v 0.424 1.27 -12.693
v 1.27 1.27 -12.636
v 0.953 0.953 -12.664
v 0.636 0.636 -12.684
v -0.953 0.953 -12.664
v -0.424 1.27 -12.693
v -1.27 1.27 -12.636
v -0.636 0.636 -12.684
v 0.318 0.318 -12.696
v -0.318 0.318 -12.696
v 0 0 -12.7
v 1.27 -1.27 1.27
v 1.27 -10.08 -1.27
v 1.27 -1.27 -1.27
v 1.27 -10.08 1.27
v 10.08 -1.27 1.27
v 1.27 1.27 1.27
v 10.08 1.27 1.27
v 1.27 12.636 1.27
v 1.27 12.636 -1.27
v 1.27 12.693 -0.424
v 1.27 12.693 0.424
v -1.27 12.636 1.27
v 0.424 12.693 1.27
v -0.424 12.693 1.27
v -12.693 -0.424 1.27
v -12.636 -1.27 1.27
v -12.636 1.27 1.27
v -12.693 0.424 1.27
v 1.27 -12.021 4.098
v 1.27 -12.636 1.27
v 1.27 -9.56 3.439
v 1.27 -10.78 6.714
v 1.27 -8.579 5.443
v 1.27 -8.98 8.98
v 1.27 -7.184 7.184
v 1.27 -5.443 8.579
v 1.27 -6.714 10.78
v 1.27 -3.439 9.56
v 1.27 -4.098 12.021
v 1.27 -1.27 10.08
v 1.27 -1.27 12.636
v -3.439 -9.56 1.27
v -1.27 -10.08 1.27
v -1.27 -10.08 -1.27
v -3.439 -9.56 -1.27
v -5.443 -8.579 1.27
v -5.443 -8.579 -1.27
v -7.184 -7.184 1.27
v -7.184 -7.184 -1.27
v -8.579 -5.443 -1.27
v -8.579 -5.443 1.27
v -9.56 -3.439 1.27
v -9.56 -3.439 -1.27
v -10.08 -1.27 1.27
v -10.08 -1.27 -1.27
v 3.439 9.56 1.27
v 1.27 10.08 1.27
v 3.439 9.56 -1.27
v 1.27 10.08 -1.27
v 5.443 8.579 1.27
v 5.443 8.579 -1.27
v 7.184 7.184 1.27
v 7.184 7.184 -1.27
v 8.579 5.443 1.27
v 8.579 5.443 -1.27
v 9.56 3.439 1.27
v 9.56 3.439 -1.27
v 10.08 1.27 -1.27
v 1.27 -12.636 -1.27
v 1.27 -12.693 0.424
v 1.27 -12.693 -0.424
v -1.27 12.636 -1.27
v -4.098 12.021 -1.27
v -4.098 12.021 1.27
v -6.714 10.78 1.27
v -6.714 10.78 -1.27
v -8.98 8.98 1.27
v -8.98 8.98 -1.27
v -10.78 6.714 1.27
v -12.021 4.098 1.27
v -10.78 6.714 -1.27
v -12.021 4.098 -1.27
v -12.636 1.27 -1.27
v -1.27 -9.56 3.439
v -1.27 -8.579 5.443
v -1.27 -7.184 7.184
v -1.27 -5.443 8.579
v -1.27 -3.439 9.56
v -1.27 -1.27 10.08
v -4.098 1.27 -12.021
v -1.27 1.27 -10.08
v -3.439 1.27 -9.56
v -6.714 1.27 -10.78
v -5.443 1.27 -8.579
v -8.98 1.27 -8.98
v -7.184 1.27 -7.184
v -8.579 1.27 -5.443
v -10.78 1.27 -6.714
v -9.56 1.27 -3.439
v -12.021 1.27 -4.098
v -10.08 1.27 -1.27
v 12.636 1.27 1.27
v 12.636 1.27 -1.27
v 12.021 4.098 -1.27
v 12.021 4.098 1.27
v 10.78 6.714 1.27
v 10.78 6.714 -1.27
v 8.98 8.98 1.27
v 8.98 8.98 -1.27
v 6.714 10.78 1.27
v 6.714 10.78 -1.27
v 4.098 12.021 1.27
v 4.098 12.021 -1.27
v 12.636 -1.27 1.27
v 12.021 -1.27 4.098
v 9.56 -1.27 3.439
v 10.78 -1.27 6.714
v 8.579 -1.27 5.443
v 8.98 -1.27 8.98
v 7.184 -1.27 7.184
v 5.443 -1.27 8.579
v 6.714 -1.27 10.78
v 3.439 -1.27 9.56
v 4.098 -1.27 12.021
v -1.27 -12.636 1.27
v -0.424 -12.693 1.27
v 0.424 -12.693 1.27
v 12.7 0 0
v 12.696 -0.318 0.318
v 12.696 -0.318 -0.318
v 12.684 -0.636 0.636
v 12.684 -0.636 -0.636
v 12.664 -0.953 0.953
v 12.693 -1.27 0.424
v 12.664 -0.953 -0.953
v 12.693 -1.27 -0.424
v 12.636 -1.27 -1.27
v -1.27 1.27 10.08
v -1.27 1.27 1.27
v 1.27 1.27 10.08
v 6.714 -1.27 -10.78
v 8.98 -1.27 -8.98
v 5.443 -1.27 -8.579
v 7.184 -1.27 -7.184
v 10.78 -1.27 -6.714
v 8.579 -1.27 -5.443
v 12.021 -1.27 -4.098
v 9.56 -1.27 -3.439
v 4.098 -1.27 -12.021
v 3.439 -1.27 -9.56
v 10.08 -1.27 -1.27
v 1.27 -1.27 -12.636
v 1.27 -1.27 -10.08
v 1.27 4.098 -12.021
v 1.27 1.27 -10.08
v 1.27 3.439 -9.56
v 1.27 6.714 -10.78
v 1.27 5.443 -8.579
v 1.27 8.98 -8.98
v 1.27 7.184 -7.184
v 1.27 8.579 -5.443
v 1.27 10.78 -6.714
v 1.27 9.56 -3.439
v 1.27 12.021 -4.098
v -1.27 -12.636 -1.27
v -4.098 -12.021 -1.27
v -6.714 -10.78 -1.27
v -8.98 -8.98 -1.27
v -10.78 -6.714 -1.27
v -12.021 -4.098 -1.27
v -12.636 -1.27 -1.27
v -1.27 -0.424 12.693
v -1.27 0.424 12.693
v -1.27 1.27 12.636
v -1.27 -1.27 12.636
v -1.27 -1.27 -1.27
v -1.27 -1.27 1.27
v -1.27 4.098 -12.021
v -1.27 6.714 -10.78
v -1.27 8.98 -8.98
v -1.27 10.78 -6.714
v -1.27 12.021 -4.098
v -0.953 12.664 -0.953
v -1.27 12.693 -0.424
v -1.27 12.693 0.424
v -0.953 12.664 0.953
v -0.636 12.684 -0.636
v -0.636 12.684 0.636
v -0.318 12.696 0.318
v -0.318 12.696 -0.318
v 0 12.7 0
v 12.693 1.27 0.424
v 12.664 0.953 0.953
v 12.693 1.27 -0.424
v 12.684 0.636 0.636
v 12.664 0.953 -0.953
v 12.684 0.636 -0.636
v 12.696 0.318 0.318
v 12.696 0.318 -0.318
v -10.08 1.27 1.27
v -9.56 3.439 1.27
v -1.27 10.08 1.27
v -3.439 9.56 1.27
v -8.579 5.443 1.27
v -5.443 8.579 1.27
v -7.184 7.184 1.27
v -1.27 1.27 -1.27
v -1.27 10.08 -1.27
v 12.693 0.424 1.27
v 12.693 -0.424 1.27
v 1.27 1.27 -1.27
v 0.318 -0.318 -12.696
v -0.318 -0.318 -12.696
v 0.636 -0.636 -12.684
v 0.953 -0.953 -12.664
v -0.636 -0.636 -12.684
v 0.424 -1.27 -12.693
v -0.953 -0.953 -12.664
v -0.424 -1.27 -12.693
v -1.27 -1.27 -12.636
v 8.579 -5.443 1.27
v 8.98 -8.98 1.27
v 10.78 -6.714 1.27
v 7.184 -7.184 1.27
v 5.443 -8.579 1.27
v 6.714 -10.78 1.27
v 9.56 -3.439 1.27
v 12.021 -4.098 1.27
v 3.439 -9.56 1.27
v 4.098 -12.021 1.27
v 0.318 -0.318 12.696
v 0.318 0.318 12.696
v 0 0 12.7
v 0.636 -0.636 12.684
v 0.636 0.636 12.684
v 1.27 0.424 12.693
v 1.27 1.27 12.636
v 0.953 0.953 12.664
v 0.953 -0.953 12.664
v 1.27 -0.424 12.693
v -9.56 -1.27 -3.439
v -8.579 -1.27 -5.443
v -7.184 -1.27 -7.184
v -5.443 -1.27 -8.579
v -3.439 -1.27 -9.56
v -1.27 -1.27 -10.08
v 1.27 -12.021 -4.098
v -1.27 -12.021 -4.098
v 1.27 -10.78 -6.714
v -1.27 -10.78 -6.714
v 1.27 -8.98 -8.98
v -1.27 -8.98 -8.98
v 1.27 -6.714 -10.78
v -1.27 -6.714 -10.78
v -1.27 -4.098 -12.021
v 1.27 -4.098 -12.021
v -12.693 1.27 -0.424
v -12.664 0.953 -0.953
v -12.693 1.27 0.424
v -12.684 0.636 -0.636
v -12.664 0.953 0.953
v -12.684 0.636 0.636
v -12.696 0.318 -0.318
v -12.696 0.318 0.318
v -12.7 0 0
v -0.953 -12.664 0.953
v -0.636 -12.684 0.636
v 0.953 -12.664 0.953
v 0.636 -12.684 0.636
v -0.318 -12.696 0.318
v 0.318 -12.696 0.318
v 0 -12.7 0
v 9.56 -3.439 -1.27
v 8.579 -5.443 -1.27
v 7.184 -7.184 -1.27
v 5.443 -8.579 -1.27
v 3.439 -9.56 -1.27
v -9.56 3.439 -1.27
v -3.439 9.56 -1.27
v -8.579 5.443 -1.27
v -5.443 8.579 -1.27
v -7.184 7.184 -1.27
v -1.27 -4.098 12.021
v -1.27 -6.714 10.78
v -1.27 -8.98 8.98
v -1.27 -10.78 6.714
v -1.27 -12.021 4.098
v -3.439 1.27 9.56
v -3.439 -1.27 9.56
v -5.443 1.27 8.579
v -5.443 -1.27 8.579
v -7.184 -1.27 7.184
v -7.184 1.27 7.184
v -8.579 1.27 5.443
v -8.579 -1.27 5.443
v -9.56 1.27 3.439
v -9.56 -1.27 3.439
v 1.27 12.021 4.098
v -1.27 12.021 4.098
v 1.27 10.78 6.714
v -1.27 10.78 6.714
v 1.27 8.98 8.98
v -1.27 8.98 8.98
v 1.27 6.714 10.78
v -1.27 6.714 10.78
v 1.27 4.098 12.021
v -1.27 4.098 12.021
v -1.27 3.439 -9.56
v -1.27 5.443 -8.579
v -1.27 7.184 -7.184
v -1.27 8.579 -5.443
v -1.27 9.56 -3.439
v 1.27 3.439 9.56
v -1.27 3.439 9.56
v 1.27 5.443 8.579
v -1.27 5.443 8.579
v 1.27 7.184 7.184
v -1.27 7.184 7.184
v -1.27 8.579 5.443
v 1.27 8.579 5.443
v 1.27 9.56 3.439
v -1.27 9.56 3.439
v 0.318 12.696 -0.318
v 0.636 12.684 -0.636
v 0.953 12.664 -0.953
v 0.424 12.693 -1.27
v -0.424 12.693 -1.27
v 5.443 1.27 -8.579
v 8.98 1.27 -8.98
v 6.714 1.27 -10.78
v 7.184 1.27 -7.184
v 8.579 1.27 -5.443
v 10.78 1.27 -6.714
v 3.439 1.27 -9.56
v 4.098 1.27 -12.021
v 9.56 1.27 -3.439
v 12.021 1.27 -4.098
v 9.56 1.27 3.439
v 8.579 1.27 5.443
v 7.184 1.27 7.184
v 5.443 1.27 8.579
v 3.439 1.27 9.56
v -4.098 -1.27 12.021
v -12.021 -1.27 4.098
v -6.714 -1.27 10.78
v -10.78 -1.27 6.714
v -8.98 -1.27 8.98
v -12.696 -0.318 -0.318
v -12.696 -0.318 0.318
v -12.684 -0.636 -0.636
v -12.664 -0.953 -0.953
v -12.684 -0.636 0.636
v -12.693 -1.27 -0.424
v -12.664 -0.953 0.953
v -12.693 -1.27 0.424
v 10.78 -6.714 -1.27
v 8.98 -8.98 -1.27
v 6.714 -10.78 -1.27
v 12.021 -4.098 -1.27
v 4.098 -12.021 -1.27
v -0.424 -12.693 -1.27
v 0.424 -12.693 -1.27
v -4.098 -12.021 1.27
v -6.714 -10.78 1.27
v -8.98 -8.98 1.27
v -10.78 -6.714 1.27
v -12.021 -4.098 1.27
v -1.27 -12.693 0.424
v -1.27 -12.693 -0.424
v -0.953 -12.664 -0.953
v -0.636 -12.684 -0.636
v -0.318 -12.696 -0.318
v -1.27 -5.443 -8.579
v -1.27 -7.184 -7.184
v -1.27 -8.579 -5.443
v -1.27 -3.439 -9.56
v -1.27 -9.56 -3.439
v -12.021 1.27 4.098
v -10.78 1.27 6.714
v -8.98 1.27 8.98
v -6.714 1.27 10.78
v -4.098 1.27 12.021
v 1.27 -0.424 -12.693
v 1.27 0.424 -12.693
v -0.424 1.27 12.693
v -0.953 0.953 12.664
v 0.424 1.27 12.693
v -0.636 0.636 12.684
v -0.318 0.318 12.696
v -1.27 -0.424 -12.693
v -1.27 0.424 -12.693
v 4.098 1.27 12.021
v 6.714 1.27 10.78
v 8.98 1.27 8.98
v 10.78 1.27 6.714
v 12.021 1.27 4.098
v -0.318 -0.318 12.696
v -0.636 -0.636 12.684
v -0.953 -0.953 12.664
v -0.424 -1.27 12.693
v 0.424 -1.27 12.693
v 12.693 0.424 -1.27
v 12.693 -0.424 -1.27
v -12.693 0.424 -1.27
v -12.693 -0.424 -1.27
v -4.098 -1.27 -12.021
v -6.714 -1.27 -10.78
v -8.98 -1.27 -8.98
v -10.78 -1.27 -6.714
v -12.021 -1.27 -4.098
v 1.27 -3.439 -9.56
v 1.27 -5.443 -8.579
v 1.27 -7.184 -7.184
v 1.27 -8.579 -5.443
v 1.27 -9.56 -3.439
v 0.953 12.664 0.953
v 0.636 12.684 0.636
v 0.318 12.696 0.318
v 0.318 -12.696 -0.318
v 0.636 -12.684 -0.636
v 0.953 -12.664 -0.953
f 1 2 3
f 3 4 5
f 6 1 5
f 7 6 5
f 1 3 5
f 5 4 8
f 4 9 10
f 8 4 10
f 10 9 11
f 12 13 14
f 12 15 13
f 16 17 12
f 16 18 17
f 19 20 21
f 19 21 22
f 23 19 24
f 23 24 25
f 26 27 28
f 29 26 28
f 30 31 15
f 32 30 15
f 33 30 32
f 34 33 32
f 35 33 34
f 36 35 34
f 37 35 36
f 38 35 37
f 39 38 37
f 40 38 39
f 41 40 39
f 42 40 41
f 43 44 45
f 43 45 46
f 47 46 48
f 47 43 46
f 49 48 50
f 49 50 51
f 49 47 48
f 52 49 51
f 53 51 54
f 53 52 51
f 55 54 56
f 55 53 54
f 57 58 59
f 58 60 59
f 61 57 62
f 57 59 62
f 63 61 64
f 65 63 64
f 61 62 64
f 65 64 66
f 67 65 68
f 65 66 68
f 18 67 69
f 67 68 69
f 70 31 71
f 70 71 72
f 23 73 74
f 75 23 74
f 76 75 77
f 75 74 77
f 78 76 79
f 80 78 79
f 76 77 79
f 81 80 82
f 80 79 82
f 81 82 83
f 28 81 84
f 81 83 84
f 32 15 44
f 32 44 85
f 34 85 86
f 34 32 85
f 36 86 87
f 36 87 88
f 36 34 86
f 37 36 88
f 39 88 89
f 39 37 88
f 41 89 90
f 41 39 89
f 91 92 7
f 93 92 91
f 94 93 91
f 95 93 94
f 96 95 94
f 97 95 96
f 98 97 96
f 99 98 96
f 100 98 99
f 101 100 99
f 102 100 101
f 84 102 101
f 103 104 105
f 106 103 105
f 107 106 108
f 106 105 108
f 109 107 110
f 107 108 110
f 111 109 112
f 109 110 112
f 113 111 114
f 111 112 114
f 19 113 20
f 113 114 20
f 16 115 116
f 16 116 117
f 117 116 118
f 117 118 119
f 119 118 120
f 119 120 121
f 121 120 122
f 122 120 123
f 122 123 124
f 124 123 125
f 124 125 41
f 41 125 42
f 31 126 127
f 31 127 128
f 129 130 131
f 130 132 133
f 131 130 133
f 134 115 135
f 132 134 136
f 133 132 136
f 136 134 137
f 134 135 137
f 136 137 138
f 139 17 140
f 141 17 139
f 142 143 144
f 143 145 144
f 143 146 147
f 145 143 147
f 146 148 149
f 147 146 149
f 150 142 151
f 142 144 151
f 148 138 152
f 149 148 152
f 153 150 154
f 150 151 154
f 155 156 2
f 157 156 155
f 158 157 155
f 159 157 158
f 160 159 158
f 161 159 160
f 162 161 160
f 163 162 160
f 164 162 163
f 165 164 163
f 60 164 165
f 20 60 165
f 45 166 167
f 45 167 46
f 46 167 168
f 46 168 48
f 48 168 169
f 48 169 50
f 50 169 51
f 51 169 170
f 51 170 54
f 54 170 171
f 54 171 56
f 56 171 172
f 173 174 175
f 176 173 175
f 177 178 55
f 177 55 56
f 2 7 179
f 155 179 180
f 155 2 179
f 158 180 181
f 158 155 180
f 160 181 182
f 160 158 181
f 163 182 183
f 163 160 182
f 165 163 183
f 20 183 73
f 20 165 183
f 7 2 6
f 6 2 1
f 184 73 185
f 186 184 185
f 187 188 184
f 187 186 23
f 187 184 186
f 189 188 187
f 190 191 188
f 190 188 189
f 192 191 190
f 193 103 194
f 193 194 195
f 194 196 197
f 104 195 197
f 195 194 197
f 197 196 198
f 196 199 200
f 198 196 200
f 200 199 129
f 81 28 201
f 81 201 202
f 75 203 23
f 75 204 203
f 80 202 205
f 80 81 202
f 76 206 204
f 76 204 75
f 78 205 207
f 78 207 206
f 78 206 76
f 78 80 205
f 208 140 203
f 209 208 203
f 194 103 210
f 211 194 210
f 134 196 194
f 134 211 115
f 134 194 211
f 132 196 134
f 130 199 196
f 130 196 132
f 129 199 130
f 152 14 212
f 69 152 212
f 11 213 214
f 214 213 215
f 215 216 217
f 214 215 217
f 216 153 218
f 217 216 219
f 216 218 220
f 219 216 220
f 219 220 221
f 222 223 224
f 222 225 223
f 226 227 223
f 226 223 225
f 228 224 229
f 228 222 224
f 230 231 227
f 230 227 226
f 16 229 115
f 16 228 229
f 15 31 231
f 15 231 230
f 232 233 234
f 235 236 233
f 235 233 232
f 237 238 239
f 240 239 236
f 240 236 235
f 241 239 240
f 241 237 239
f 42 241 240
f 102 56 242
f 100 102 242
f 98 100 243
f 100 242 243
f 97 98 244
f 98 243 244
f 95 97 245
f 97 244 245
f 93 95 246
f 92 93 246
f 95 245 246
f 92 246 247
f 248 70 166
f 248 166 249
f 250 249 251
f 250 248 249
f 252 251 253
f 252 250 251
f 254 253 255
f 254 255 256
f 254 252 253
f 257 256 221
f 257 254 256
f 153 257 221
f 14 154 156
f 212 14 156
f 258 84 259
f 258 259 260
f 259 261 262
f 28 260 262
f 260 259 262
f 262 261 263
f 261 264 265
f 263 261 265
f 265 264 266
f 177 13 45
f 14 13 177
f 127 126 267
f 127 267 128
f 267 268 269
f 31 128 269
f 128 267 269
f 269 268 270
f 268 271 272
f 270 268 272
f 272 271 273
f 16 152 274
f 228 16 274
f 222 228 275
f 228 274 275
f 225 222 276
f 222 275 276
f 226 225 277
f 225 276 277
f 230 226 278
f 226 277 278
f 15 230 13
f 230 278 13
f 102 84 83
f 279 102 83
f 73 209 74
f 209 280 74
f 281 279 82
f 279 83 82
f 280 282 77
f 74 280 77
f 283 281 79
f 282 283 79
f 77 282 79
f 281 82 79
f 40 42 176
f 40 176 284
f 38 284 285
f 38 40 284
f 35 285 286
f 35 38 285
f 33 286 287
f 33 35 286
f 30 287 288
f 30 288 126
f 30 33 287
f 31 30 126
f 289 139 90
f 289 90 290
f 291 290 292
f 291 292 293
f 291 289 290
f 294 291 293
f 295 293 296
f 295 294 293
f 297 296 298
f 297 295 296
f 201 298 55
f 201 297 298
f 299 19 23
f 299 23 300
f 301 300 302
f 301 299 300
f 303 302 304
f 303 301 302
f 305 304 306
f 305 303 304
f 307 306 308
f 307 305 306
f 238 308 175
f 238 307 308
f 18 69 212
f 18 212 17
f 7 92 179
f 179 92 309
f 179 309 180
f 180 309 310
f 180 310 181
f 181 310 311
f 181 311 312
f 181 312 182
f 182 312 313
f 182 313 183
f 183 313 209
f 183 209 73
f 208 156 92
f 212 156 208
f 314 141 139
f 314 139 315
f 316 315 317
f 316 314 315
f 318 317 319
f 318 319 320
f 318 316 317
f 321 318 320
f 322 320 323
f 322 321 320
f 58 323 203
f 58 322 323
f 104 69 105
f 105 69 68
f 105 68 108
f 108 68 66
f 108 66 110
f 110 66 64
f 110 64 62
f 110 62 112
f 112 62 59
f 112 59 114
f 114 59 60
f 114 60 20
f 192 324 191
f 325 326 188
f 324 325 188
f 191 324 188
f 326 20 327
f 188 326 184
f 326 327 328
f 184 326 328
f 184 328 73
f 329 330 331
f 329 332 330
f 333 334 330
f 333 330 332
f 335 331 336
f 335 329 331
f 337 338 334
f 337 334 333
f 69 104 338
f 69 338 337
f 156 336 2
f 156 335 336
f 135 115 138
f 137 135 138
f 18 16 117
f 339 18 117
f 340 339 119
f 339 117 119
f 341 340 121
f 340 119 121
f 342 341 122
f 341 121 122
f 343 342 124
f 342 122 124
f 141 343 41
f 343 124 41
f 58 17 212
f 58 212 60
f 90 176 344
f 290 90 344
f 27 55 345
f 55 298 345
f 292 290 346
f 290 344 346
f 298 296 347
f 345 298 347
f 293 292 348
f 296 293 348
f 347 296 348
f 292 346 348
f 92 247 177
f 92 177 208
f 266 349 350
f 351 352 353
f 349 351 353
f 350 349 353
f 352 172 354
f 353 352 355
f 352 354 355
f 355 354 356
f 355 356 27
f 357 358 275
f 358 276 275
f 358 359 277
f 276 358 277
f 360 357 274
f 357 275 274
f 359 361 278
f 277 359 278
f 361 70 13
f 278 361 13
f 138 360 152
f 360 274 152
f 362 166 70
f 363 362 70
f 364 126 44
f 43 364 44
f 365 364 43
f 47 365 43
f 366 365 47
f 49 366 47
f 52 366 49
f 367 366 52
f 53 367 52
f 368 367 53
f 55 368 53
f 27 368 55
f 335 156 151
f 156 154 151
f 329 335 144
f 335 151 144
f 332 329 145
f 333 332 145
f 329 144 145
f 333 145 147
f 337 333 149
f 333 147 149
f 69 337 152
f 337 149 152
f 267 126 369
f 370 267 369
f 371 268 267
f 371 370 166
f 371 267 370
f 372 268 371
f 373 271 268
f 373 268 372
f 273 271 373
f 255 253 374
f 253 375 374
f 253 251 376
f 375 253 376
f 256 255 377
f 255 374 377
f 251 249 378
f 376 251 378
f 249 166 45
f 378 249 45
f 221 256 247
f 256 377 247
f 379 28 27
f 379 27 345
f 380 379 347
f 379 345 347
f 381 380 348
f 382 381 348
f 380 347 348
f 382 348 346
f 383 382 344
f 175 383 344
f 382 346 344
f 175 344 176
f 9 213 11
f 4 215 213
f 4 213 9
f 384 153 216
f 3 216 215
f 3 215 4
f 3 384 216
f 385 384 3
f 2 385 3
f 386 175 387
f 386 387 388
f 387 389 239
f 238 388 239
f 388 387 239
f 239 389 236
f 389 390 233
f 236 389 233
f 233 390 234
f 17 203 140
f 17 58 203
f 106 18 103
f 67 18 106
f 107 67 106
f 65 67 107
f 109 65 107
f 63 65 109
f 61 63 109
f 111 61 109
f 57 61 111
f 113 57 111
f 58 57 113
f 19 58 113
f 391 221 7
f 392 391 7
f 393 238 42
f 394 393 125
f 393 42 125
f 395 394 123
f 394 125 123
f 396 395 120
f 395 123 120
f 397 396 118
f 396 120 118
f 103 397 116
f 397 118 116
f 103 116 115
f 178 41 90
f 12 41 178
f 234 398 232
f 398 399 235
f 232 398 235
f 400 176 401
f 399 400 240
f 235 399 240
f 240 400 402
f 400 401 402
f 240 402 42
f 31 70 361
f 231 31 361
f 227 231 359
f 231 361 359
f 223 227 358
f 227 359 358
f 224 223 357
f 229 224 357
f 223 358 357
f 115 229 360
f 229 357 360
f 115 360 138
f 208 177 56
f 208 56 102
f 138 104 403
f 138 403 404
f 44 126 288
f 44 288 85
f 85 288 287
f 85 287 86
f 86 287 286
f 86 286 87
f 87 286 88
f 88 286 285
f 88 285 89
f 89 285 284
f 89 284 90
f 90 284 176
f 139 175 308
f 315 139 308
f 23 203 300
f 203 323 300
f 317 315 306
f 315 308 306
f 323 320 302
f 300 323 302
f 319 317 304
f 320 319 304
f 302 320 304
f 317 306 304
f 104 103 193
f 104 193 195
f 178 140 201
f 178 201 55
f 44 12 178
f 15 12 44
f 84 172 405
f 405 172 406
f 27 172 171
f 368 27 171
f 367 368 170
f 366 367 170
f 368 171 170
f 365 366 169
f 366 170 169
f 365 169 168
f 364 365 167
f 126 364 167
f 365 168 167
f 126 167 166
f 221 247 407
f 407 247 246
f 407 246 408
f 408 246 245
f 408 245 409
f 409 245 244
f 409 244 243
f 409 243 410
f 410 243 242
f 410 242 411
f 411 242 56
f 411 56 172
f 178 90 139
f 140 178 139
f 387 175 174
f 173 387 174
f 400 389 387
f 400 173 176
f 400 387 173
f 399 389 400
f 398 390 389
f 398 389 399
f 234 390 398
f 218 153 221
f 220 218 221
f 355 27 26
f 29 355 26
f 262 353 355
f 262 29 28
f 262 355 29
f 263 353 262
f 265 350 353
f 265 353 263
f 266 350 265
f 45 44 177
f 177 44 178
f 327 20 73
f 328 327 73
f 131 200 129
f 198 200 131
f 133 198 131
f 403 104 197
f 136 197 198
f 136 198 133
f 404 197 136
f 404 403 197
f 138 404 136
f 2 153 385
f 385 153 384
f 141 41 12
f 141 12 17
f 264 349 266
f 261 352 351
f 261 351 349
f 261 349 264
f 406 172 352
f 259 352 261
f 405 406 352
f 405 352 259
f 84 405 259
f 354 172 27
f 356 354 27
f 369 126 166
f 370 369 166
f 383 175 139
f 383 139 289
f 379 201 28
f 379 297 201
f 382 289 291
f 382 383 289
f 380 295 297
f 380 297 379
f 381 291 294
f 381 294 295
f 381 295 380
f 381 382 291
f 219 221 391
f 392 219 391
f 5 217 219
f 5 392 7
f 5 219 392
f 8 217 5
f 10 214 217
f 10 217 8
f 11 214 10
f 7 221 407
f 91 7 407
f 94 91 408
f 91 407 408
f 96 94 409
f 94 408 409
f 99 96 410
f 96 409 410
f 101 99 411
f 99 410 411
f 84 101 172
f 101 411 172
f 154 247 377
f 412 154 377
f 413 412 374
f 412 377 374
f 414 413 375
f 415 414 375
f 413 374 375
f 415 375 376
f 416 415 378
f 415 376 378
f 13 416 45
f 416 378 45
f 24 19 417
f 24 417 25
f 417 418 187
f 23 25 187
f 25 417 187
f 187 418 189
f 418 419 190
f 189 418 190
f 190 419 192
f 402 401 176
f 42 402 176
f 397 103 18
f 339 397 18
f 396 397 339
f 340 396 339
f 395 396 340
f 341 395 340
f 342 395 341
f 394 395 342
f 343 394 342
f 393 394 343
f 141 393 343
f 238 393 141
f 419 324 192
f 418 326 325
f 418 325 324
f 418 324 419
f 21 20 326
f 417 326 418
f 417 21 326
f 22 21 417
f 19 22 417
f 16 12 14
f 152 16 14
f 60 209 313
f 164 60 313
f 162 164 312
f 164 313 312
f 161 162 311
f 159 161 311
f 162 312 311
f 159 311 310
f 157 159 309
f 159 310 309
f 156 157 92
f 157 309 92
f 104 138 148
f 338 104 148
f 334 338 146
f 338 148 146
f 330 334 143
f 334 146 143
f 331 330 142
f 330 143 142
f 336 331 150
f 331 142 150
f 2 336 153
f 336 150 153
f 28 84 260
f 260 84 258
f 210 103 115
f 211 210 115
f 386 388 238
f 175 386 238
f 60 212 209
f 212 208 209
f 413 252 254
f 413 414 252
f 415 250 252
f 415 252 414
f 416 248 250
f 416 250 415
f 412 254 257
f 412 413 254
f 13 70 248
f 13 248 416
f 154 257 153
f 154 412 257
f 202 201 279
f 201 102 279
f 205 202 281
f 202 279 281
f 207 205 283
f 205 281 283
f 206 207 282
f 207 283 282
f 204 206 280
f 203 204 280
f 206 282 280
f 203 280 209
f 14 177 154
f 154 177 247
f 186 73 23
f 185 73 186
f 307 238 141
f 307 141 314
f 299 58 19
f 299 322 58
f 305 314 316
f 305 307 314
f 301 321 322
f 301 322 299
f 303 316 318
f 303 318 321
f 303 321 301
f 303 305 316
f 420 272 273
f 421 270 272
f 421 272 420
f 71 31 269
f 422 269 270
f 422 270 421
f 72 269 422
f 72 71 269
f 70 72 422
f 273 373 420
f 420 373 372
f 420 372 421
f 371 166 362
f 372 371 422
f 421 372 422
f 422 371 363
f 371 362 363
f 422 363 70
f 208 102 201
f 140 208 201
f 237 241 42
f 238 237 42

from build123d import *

# Parameters (mm, degrees)
F0_R          = 12.7
F1_DEPTH      = 1.27
F1_DEPTH_BACK = 1.27
F0_W          = 2.54
F0_H          = 2.54
F2_DEPTH      = 10.16
F2_DEPTH_BACK = 10.16
F3_DEPTH      = 1.27
F3_DEPTH_BACK = 1.27
F4_DEPTH      = 1.27
F4_DEPTH_BACK = 1.27
F5_DEPTH      = 1.27
F5_DEPTH_BACK = 1.27
F6_DEPTH      = 1.27
F6_DEPTH_BACK = 1.27


# Not quite as in the source:
# - a feature of the source that left no trace in its solid (it failed there, or was rolled back) is left out
# - a pattern or mirror of a feature is missing from the dataset's text; its kind, count and spacing are read off the source's solid


with BuildPart() as f1:
    # F0 (on Right) → F1 (new body, two sides)
    with BuildSketch(Plane.YZ) as f1_sk:
        Circle(F0_R)
        with BuildLine():
            ThreePointArc((-10.0803124952, 1.27), (-7.1842048969, 7.1842048969), (-1.27, 10.0803124952))
            ThreePointArc((-1.27, 10.0803124952), (0, 10.16), (1.27, 10.0803124952))
            ThreePointArc((1.27, 10.0803124952), (7.1842048969, 7.1842048969), (10.0803124952, 1.27))
            ThreePointArc((10.0803124952, 1.27), (10.1400585538, 0.6362487914), (10.16, 0))
            ThreePointArc((10.16, 0), (10.1400585538, -0.6362487914), (10.0803124952, -1.27))
            ThreePointArc((10.0803124952, -1.27), (7.1842048969, -7.1842048969), (1.27, -10.0803124952))
            ThreePointArc((1.27, -10.0803124952), (0, -10.16), (-1.27, -10.0803124952))
            ThreePointArc((-1.27, -10.0803124952), (-7.1842048969, -7.1842048969), (-10.0803124952, -1.27))
            ThreePointArc((-10.0803124952, -1.27), (-10.16, 0), (-10.0803124952, 1.27))
        make_face(mode=Mode.SUBTRACT)
    extrude(amount=F1_DEPTH)
    extrude(f1_sk.sketch, amount=-F1_DEPTH_BACK)

    # F1_copies: F1 across plane


with BuildPart() as f1_1:
    add(f1.part)
    add(f1.part.mirror(Plane(origin=(0, 0, 0), x_dir=(0.7071067812, 0, -0.7071067812), z_dir=(0.7071067812, 0, 0.7071067812))))

    # F1_copies1: F1 across plane


with BuildPart() as f1_2:
    add(f1_1.part)
    add(f1_1.part.mirror(Plane(origin=(0, 0, 0), x_dir=(-0.7071067812, 0.7071067812, 0), z_dir=(-0.7071067812, -0.7071067812, 0))))

    # F0 (on Right) → F2 (join, two sides)
    with BuildSketch(Plane.YZ) as f2_sk:
        Rectangle(F0_W, F0_H)
    extrude(amount=F2_DEPTH)
    extrude(f2_sk.sketch, amount=-F2_DEPTH_BACK)

    # F0 (on Right) → F3 (join, two sides)
    with BuildSketch(Plane.YZ) as f3_sk:
        with BuildLine():
            Line((1.27, -1.27), (-1.27, -1.27))
            Line((-1.27, -1.27), (-1.27, -10.0803124952))
            ThreePointArc((-1.27, -10.0803124952), (0, -10.16), (1.27, -10.0803124952))
            Line((1.27, -10.0803124952), (1.27, -1.27))
        make_face()
    extrude(amount=F3_DEPTH)
    extrude(f3_sk.sketch, amount=-F3_DEPTH_BACK)

    # F0 (on Right) → F4 (join, two sides)
    with BuildSketch(Plane.YZ) as f4_sk:
        with BuildLine():
            Line((10.0803124952, 1.27), (1.27, 1.27))
            Line((1.27, 1.27), (1.27, -1.27))
            Line((1.27, -1.27), (10.0803124952, -1.27))
            ThreePointArc((10.0803124952, -1.27), (10.1400585538, -0.6362487914), (10.16, 0))
            ThreePointArc((10.16, 0), (10.1400585538, 0.6362487914), (10.0803124952, 1.27))
        make_face()
    extrude(amount=F4_DEPTH)
    extrude(f4_sk.sketch, amount=-F4_DEPTH_BACK)

    # F0 (on Right) → F5 (join, two sides)
    with BuildSketch(Plane.YZ) as f5_sk:
        with BuildLine():
            Line((-1.27, -1.27), (-1.27, 1.27))
            Line((-1.27, 1.27), (-10.0803124952, 1.27))
            ThreePointArc((-10.0803124952, 1.27), (-10.16, 0), (-10.0803124952, -1.27))
            Line((-10.0803124952, -1.27), (-1.27, -1.27))
        make_face()
    extrude(amount=F5_DEPTH)
    extrude(f5_sk.sketch, amount=-F5_DEPTH_BACK)

    # F0 (on Right) → F6 (join, two sides)
    with BuildSketch(Plane.YZ) as f6_sk:
        with BuildLine():
            Line((-1.27, 10.0803124952), (-1.27, 1.27))
            Line((-1.27, 1.27), (1.27, 1.27))
            Line((1.27, 1.27), (1.27, 10.0803124952))
            ThreePointArc((1.27, 10.0803124952), (0, 10.16), (-1.27, 10.0803124952))
        make_face()
    extrude(amount=F6_DEPTH)
    extrude(f6_sk.sketch, amount=-F6_DEPTH_BACK)


solid = f1_2.part
